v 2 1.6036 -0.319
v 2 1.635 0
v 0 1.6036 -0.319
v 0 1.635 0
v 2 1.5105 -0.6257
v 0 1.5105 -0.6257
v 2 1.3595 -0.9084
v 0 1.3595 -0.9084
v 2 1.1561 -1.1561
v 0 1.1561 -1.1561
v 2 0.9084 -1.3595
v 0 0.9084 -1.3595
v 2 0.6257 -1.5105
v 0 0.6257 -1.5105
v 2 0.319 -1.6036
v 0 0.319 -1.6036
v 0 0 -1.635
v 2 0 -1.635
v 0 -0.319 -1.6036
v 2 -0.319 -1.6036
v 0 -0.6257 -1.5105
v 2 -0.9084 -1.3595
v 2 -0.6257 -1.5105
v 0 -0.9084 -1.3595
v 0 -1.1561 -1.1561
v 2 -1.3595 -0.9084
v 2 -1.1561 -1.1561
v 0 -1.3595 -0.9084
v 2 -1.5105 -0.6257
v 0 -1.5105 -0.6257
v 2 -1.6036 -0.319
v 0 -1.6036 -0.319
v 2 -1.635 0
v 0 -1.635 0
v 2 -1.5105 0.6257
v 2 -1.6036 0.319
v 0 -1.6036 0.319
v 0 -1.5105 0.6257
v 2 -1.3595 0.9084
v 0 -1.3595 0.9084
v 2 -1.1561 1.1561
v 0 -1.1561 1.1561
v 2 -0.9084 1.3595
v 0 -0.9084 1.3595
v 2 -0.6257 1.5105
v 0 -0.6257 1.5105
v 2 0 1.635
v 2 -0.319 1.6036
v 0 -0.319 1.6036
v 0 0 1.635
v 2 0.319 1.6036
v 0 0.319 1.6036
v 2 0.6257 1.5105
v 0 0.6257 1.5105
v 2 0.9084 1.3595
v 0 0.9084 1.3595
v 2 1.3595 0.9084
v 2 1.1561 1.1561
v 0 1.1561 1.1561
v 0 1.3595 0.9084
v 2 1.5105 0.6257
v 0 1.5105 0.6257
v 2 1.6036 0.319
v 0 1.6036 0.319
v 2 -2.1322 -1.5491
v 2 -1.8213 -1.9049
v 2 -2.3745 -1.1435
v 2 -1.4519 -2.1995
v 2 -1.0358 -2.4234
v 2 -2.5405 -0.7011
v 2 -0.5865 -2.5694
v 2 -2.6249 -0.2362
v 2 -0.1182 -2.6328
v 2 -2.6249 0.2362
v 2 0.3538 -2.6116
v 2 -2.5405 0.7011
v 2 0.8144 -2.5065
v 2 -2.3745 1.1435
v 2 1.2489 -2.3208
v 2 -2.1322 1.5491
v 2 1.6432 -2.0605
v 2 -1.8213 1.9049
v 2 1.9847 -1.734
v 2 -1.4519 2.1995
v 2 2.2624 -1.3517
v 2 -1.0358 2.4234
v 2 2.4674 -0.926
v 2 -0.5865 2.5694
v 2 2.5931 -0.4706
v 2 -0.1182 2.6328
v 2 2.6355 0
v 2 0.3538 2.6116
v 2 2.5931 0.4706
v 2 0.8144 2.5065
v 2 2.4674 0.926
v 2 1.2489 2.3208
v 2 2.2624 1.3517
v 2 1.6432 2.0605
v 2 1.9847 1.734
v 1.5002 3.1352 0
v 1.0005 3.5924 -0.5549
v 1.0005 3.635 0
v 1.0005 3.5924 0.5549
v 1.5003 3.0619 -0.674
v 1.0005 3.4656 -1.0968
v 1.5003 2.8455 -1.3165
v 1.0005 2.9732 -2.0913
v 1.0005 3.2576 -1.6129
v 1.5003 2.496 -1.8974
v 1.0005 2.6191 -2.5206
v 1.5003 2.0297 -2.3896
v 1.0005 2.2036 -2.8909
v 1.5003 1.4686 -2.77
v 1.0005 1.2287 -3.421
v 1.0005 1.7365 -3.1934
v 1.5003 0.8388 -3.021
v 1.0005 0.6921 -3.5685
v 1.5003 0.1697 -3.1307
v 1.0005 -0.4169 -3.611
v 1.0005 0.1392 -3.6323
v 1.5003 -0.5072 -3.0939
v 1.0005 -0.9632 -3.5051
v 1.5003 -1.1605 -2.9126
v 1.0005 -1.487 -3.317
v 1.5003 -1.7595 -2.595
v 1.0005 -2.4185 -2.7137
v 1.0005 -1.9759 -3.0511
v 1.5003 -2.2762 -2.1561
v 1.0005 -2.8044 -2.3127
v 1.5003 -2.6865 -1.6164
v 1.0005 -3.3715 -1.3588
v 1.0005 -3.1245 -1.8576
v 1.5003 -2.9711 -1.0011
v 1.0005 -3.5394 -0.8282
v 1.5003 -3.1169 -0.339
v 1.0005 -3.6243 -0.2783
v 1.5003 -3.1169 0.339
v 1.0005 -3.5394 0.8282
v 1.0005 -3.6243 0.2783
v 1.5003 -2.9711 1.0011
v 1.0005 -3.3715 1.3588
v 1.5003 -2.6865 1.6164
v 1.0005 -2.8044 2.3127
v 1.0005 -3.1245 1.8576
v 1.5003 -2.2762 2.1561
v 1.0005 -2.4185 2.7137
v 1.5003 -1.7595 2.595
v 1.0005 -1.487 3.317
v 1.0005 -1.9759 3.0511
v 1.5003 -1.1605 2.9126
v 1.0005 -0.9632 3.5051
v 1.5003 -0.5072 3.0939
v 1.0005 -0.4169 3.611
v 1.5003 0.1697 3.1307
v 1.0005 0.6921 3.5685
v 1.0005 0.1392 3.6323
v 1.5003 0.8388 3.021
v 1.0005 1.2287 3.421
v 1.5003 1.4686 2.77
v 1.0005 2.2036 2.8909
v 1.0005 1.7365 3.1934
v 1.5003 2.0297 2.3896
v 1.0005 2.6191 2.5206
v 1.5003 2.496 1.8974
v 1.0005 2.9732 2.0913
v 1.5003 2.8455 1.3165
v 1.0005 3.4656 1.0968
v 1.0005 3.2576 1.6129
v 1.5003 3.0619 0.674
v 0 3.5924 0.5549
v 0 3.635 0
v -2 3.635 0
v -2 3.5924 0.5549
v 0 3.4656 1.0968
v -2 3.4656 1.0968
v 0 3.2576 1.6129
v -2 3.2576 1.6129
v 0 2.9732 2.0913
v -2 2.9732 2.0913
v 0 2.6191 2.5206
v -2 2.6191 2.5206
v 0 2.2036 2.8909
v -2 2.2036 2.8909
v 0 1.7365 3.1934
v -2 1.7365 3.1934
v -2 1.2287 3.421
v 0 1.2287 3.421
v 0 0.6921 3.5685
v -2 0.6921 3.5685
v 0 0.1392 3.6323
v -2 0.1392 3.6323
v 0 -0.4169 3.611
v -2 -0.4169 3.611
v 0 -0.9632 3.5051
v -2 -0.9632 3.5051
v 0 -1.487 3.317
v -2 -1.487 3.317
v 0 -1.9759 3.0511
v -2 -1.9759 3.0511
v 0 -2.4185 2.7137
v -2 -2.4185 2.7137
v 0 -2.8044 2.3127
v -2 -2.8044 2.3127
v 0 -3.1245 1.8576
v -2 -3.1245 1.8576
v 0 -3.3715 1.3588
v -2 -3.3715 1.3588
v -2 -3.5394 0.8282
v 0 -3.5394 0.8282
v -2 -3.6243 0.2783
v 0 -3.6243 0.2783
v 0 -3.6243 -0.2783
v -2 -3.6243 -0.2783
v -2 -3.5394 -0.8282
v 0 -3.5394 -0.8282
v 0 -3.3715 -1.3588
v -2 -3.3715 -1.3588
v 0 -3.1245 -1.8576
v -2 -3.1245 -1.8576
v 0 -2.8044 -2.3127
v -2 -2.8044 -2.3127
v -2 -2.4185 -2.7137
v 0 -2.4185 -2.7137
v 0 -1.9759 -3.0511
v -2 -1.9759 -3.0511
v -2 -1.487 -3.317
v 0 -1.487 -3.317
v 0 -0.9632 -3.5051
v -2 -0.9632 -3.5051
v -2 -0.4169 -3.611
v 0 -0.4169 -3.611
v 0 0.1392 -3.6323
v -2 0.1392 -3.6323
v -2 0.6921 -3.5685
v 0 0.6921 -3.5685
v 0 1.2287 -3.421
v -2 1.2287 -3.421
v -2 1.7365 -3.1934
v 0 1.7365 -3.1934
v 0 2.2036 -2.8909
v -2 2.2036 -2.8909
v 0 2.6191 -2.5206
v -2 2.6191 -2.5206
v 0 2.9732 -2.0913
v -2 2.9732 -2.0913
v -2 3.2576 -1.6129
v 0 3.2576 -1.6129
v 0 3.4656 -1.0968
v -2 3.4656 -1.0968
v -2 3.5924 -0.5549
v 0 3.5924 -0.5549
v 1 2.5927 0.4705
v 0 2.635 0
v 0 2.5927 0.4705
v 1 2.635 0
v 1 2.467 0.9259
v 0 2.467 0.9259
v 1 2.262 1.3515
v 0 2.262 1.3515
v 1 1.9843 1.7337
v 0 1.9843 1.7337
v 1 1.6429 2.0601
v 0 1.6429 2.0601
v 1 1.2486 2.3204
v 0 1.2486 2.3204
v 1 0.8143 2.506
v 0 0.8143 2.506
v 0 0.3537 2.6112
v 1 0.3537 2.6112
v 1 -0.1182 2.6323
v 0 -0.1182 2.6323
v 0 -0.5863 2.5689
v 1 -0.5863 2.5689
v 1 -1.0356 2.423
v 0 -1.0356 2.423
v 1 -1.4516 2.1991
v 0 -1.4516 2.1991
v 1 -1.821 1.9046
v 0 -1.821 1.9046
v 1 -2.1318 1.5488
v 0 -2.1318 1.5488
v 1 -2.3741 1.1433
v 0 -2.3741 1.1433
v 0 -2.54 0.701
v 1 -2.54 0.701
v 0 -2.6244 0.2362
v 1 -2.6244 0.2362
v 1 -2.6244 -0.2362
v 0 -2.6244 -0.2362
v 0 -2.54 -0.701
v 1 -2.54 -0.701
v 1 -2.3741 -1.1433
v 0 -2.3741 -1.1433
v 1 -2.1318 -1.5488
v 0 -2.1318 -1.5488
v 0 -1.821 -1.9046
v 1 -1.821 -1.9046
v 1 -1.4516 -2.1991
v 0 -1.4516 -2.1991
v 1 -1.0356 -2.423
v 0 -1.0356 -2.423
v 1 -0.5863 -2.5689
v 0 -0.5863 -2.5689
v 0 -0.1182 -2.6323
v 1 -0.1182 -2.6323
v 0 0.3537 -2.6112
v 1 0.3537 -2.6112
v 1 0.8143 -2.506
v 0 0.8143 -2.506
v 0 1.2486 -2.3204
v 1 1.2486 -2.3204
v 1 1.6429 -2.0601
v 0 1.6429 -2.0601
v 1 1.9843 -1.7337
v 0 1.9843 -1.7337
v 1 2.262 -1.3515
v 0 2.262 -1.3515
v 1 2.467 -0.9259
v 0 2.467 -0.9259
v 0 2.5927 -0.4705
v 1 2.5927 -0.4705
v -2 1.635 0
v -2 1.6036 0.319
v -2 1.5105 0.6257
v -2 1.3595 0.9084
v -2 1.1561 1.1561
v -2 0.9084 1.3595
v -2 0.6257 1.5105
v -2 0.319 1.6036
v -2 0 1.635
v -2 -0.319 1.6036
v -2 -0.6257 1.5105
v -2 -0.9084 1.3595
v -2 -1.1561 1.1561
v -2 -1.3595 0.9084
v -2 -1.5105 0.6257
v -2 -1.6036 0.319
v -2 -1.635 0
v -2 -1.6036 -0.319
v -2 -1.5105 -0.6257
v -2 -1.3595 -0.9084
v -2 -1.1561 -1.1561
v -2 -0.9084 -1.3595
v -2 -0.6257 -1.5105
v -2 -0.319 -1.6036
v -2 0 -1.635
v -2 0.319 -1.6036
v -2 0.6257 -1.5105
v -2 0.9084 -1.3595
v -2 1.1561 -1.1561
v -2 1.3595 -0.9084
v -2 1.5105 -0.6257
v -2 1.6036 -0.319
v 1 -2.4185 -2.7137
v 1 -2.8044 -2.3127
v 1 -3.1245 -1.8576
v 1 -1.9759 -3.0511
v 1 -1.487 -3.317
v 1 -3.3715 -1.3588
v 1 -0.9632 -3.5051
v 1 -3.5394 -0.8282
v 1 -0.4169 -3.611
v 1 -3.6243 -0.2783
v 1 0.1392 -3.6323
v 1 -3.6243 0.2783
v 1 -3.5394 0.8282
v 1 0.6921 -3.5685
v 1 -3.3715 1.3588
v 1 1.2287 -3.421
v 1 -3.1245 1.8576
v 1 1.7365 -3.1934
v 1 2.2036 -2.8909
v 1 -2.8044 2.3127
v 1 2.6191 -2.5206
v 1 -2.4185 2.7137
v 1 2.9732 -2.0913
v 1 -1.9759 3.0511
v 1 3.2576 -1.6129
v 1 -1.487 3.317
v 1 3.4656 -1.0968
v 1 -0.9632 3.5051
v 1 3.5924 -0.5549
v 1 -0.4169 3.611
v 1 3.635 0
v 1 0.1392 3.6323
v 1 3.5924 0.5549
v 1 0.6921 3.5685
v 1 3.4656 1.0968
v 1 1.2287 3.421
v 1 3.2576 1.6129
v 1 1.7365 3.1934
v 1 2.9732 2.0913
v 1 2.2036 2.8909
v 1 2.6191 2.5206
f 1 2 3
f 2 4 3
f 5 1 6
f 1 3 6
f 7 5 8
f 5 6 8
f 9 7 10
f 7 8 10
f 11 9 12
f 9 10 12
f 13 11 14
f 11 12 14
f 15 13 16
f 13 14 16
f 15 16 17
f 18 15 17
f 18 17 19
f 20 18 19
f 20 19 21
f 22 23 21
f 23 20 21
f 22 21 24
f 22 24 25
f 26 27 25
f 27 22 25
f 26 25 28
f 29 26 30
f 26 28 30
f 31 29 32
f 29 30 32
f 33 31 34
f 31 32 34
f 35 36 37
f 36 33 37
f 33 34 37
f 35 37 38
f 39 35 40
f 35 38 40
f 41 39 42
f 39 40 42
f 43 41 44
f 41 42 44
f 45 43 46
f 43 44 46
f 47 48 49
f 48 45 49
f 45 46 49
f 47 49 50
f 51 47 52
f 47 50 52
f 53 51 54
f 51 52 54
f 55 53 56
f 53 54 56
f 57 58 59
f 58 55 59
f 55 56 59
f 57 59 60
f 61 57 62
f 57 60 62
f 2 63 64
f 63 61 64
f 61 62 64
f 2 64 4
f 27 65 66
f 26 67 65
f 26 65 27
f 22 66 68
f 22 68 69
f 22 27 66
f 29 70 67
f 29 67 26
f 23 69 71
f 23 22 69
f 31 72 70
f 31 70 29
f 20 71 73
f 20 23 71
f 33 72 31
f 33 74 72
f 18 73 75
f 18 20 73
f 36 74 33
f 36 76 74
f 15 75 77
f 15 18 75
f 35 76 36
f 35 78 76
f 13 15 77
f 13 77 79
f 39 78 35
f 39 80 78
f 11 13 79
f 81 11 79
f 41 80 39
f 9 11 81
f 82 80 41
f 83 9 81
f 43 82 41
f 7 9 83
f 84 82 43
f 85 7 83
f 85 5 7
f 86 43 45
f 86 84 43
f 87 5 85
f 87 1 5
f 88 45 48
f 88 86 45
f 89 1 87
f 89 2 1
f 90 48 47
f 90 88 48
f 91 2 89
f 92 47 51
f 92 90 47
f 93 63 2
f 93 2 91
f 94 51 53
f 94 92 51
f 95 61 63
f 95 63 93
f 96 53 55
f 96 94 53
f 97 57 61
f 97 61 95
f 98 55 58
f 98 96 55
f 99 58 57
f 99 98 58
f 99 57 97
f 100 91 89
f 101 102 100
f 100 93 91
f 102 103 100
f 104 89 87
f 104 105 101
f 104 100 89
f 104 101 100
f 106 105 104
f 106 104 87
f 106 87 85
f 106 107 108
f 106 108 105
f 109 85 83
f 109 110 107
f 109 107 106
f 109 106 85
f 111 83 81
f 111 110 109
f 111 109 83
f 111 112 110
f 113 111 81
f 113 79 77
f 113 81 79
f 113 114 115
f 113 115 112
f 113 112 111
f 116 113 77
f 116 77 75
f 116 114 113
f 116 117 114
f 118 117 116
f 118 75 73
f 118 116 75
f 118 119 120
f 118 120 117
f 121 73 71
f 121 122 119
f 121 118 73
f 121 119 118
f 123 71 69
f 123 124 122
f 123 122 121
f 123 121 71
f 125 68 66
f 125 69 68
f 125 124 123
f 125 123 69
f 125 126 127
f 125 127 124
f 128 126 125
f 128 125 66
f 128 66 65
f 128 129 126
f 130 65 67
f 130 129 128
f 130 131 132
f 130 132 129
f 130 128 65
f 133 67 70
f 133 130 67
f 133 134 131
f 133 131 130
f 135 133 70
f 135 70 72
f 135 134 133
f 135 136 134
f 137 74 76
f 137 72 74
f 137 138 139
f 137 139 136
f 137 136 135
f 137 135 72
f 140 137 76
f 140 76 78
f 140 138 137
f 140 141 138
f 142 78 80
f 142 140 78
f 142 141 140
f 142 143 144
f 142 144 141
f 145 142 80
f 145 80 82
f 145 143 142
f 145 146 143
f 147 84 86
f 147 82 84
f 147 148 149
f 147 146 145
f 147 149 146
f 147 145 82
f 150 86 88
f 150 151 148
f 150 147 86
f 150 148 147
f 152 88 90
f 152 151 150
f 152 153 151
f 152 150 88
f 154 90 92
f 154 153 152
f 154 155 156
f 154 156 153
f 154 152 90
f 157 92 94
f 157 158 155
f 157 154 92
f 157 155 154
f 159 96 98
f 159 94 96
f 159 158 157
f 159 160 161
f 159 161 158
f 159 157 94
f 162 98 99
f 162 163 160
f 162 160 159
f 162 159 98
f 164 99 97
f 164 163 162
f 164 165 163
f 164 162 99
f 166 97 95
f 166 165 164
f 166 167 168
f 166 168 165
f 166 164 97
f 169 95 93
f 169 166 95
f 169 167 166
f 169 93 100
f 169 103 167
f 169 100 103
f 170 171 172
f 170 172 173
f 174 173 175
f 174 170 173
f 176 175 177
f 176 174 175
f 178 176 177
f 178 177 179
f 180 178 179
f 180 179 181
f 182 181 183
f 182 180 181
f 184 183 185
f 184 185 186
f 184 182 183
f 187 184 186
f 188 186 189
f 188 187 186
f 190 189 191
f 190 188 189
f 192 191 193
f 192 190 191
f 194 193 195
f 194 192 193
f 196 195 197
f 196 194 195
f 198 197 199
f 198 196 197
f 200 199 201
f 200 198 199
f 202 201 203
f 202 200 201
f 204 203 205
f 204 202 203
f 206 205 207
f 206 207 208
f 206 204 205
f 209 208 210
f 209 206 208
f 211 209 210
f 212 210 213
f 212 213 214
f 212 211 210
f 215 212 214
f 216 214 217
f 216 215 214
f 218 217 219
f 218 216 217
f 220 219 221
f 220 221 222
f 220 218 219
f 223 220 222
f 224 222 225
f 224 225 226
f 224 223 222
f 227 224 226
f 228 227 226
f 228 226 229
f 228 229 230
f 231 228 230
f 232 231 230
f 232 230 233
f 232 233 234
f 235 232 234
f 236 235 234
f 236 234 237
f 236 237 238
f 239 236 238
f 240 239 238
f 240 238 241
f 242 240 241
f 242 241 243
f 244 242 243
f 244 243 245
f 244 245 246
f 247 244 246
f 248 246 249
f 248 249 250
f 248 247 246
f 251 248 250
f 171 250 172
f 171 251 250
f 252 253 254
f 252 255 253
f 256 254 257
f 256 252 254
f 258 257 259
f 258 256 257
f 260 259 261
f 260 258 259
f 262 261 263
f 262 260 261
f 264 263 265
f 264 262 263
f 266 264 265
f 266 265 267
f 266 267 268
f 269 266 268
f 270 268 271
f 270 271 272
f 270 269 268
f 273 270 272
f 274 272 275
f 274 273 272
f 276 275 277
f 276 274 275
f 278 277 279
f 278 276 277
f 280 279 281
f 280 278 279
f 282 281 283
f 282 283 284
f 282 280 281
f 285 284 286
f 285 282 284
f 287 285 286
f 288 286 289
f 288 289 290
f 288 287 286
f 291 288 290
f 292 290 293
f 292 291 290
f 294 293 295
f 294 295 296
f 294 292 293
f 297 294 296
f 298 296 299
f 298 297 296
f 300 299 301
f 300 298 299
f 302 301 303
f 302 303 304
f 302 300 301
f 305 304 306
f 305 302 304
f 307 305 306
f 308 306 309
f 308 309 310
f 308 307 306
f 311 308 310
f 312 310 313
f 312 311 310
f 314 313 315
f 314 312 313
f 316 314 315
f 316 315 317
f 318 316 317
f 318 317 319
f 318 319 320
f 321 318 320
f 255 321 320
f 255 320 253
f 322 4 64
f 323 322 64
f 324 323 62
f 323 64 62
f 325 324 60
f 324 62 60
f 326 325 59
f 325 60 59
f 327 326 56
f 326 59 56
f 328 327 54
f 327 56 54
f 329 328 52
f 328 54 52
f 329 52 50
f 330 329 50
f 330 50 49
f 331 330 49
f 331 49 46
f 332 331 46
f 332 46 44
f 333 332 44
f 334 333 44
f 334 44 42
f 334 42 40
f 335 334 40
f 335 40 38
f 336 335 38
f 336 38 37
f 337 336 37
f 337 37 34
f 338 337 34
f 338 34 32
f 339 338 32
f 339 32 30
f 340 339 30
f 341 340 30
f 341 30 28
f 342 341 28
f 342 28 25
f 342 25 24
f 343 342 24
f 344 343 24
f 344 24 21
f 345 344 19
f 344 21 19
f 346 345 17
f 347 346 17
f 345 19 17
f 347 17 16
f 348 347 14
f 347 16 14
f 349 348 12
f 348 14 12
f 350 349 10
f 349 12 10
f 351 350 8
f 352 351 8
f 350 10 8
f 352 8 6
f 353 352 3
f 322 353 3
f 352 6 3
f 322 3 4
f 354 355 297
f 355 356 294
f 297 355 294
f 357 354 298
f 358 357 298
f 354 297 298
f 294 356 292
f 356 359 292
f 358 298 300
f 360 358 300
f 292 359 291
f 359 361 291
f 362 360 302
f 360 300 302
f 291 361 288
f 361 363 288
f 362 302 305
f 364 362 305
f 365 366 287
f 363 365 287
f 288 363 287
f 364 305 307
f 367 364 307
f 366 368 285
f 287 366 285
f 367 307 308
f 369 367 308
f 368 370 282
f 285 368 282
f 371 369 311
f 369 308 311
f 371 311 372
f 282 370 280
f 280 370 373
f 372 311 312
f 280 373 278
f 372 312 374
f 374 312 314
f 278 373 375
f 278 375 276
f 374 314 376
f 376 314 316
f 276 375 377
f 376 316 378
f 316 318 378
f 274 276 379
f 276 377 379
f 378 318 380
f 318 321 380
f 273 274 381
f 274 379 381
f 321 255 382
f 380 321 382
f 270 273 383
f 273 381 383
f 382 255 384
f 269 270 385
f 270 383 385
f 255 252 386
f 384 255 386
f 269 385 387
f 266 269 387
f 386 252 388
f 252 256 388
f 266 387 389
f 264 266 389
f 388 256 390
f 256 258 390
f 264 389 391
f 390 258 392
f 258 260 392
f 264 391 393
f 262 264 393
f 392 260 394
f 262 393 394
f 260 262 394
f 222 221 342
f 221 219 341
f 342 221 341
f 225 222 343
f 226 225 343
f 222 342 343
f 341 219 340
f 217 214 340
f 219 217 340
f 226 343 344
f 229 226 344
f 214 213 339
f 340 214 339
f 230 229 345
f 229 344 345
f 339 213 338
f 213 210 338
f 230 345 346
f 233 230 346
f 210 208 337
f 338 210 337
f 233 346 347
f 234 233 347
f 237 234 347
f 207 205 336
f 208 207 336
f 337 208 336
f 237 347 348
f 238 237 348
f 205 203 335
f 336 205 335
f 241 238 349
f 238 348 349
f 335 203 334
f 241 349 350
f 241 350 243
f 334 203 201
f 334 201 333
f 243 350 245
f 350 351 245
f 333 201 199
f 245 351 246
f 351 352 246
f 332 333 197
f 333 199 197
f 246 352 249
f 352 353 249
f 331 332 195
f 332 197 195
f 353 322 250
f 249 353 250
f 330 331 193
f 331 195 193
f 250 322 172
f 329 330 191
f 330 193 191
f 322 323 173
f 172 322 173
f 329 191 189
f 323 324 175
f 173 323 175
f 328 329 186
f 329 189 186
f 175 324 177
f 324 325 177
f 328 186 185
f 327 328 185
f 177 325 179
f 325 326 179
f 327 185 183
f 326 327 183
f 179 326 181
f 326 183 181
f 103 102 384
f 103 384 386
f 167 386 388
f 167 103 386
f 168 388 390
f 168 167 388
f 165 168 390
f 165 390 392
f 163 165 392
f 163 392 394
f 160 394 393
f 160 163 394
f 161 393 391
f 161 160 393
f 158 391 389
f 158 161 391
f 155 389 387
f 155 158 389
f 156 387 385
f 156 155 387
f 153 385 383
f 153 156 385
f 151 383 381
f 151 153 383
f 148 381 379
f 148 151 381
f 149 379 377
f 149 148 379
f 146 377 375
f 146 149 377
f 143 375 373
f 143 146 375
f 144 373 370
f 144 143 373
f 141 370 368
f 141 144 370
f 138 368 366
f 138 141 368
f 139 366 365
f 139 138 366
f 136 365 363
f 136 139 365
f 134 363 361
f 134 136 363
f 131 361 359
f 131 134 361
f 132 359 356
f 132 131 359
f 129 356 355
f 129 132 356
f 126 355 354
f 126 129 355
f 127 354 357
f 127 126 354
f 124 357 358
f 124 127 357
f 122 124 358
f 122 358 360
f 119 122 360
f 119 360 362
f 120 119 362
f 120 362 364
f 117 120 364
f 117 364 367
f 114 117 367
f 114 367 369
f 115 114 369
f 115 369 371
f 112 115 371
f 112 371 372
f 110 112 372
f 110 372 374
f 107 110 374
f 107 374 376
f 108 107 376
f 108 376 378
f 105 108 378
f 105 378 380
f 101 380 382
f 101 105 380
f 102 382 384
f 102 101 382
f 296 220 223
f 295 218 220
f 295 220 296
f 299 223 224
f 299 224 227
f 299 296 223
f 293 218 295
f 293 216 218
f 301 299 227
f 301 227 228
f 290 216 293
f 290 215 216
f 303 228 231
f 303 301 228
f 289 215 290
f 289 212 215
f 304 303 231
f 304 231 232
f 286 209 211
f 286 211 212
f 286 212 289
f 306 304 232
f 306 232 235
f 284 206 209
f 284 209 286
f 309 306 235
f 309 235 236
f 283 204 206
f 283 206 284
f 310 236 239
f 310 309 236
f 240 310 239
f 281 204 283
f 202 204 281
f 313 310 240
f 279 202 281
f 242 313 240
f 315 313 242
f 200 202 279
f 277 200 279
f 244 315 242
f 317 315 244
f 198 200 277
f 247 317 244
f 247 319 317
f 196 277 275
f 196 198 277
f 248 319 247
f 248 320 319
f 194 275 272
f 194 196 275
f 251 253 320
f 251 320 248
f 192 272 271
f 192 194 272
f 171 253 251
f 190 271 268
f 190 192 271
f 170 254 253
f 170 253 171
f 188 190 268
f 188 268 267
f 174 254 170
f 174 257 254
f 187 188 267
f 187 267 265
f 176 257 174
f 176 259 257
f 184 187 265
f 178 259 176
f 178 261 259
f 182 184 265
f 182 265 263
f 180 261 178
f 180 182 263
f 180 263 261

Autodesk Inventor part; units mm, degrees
ref_plane "YZ Plane" through (0, 0, 0) normal (1, 0, 0) x (0, 1, 0)
ref_plane "XZ Plane" through (0, 0, 0) normal (0, 1, 0) x (-1, 0, 0)
sketch "スケッチ1" plane through (0, 0, 0) normal (1, 0, 0) x (0, 1, 0)
  circle A0 centre (0, 0) radius 3.635
  circle A1 centre (0, 0) radius 1.635
  circle A2 centre (0, 0) radius 2.635
  dimension "d0" = 3.27
  dimension "d1" = 2
  dimension "d7" = 1
extrude "押し出し1" add sketch "スケッチ1" along normal mid plane 4 contours A0 | A2
ref_plane "作業平面1" through (1, 0, 0) normal (1, 0, 0) x (0, 0, -1)
extrude "押し出し3" cut sketch "スケッチ1" against normal blind 1 from surface at 1 contours A0
chamfer "面取り3" distance 1 angle 45 1 edges at (2, -3.635, 0)
properties part number "spacer_Φ3.2_1"
